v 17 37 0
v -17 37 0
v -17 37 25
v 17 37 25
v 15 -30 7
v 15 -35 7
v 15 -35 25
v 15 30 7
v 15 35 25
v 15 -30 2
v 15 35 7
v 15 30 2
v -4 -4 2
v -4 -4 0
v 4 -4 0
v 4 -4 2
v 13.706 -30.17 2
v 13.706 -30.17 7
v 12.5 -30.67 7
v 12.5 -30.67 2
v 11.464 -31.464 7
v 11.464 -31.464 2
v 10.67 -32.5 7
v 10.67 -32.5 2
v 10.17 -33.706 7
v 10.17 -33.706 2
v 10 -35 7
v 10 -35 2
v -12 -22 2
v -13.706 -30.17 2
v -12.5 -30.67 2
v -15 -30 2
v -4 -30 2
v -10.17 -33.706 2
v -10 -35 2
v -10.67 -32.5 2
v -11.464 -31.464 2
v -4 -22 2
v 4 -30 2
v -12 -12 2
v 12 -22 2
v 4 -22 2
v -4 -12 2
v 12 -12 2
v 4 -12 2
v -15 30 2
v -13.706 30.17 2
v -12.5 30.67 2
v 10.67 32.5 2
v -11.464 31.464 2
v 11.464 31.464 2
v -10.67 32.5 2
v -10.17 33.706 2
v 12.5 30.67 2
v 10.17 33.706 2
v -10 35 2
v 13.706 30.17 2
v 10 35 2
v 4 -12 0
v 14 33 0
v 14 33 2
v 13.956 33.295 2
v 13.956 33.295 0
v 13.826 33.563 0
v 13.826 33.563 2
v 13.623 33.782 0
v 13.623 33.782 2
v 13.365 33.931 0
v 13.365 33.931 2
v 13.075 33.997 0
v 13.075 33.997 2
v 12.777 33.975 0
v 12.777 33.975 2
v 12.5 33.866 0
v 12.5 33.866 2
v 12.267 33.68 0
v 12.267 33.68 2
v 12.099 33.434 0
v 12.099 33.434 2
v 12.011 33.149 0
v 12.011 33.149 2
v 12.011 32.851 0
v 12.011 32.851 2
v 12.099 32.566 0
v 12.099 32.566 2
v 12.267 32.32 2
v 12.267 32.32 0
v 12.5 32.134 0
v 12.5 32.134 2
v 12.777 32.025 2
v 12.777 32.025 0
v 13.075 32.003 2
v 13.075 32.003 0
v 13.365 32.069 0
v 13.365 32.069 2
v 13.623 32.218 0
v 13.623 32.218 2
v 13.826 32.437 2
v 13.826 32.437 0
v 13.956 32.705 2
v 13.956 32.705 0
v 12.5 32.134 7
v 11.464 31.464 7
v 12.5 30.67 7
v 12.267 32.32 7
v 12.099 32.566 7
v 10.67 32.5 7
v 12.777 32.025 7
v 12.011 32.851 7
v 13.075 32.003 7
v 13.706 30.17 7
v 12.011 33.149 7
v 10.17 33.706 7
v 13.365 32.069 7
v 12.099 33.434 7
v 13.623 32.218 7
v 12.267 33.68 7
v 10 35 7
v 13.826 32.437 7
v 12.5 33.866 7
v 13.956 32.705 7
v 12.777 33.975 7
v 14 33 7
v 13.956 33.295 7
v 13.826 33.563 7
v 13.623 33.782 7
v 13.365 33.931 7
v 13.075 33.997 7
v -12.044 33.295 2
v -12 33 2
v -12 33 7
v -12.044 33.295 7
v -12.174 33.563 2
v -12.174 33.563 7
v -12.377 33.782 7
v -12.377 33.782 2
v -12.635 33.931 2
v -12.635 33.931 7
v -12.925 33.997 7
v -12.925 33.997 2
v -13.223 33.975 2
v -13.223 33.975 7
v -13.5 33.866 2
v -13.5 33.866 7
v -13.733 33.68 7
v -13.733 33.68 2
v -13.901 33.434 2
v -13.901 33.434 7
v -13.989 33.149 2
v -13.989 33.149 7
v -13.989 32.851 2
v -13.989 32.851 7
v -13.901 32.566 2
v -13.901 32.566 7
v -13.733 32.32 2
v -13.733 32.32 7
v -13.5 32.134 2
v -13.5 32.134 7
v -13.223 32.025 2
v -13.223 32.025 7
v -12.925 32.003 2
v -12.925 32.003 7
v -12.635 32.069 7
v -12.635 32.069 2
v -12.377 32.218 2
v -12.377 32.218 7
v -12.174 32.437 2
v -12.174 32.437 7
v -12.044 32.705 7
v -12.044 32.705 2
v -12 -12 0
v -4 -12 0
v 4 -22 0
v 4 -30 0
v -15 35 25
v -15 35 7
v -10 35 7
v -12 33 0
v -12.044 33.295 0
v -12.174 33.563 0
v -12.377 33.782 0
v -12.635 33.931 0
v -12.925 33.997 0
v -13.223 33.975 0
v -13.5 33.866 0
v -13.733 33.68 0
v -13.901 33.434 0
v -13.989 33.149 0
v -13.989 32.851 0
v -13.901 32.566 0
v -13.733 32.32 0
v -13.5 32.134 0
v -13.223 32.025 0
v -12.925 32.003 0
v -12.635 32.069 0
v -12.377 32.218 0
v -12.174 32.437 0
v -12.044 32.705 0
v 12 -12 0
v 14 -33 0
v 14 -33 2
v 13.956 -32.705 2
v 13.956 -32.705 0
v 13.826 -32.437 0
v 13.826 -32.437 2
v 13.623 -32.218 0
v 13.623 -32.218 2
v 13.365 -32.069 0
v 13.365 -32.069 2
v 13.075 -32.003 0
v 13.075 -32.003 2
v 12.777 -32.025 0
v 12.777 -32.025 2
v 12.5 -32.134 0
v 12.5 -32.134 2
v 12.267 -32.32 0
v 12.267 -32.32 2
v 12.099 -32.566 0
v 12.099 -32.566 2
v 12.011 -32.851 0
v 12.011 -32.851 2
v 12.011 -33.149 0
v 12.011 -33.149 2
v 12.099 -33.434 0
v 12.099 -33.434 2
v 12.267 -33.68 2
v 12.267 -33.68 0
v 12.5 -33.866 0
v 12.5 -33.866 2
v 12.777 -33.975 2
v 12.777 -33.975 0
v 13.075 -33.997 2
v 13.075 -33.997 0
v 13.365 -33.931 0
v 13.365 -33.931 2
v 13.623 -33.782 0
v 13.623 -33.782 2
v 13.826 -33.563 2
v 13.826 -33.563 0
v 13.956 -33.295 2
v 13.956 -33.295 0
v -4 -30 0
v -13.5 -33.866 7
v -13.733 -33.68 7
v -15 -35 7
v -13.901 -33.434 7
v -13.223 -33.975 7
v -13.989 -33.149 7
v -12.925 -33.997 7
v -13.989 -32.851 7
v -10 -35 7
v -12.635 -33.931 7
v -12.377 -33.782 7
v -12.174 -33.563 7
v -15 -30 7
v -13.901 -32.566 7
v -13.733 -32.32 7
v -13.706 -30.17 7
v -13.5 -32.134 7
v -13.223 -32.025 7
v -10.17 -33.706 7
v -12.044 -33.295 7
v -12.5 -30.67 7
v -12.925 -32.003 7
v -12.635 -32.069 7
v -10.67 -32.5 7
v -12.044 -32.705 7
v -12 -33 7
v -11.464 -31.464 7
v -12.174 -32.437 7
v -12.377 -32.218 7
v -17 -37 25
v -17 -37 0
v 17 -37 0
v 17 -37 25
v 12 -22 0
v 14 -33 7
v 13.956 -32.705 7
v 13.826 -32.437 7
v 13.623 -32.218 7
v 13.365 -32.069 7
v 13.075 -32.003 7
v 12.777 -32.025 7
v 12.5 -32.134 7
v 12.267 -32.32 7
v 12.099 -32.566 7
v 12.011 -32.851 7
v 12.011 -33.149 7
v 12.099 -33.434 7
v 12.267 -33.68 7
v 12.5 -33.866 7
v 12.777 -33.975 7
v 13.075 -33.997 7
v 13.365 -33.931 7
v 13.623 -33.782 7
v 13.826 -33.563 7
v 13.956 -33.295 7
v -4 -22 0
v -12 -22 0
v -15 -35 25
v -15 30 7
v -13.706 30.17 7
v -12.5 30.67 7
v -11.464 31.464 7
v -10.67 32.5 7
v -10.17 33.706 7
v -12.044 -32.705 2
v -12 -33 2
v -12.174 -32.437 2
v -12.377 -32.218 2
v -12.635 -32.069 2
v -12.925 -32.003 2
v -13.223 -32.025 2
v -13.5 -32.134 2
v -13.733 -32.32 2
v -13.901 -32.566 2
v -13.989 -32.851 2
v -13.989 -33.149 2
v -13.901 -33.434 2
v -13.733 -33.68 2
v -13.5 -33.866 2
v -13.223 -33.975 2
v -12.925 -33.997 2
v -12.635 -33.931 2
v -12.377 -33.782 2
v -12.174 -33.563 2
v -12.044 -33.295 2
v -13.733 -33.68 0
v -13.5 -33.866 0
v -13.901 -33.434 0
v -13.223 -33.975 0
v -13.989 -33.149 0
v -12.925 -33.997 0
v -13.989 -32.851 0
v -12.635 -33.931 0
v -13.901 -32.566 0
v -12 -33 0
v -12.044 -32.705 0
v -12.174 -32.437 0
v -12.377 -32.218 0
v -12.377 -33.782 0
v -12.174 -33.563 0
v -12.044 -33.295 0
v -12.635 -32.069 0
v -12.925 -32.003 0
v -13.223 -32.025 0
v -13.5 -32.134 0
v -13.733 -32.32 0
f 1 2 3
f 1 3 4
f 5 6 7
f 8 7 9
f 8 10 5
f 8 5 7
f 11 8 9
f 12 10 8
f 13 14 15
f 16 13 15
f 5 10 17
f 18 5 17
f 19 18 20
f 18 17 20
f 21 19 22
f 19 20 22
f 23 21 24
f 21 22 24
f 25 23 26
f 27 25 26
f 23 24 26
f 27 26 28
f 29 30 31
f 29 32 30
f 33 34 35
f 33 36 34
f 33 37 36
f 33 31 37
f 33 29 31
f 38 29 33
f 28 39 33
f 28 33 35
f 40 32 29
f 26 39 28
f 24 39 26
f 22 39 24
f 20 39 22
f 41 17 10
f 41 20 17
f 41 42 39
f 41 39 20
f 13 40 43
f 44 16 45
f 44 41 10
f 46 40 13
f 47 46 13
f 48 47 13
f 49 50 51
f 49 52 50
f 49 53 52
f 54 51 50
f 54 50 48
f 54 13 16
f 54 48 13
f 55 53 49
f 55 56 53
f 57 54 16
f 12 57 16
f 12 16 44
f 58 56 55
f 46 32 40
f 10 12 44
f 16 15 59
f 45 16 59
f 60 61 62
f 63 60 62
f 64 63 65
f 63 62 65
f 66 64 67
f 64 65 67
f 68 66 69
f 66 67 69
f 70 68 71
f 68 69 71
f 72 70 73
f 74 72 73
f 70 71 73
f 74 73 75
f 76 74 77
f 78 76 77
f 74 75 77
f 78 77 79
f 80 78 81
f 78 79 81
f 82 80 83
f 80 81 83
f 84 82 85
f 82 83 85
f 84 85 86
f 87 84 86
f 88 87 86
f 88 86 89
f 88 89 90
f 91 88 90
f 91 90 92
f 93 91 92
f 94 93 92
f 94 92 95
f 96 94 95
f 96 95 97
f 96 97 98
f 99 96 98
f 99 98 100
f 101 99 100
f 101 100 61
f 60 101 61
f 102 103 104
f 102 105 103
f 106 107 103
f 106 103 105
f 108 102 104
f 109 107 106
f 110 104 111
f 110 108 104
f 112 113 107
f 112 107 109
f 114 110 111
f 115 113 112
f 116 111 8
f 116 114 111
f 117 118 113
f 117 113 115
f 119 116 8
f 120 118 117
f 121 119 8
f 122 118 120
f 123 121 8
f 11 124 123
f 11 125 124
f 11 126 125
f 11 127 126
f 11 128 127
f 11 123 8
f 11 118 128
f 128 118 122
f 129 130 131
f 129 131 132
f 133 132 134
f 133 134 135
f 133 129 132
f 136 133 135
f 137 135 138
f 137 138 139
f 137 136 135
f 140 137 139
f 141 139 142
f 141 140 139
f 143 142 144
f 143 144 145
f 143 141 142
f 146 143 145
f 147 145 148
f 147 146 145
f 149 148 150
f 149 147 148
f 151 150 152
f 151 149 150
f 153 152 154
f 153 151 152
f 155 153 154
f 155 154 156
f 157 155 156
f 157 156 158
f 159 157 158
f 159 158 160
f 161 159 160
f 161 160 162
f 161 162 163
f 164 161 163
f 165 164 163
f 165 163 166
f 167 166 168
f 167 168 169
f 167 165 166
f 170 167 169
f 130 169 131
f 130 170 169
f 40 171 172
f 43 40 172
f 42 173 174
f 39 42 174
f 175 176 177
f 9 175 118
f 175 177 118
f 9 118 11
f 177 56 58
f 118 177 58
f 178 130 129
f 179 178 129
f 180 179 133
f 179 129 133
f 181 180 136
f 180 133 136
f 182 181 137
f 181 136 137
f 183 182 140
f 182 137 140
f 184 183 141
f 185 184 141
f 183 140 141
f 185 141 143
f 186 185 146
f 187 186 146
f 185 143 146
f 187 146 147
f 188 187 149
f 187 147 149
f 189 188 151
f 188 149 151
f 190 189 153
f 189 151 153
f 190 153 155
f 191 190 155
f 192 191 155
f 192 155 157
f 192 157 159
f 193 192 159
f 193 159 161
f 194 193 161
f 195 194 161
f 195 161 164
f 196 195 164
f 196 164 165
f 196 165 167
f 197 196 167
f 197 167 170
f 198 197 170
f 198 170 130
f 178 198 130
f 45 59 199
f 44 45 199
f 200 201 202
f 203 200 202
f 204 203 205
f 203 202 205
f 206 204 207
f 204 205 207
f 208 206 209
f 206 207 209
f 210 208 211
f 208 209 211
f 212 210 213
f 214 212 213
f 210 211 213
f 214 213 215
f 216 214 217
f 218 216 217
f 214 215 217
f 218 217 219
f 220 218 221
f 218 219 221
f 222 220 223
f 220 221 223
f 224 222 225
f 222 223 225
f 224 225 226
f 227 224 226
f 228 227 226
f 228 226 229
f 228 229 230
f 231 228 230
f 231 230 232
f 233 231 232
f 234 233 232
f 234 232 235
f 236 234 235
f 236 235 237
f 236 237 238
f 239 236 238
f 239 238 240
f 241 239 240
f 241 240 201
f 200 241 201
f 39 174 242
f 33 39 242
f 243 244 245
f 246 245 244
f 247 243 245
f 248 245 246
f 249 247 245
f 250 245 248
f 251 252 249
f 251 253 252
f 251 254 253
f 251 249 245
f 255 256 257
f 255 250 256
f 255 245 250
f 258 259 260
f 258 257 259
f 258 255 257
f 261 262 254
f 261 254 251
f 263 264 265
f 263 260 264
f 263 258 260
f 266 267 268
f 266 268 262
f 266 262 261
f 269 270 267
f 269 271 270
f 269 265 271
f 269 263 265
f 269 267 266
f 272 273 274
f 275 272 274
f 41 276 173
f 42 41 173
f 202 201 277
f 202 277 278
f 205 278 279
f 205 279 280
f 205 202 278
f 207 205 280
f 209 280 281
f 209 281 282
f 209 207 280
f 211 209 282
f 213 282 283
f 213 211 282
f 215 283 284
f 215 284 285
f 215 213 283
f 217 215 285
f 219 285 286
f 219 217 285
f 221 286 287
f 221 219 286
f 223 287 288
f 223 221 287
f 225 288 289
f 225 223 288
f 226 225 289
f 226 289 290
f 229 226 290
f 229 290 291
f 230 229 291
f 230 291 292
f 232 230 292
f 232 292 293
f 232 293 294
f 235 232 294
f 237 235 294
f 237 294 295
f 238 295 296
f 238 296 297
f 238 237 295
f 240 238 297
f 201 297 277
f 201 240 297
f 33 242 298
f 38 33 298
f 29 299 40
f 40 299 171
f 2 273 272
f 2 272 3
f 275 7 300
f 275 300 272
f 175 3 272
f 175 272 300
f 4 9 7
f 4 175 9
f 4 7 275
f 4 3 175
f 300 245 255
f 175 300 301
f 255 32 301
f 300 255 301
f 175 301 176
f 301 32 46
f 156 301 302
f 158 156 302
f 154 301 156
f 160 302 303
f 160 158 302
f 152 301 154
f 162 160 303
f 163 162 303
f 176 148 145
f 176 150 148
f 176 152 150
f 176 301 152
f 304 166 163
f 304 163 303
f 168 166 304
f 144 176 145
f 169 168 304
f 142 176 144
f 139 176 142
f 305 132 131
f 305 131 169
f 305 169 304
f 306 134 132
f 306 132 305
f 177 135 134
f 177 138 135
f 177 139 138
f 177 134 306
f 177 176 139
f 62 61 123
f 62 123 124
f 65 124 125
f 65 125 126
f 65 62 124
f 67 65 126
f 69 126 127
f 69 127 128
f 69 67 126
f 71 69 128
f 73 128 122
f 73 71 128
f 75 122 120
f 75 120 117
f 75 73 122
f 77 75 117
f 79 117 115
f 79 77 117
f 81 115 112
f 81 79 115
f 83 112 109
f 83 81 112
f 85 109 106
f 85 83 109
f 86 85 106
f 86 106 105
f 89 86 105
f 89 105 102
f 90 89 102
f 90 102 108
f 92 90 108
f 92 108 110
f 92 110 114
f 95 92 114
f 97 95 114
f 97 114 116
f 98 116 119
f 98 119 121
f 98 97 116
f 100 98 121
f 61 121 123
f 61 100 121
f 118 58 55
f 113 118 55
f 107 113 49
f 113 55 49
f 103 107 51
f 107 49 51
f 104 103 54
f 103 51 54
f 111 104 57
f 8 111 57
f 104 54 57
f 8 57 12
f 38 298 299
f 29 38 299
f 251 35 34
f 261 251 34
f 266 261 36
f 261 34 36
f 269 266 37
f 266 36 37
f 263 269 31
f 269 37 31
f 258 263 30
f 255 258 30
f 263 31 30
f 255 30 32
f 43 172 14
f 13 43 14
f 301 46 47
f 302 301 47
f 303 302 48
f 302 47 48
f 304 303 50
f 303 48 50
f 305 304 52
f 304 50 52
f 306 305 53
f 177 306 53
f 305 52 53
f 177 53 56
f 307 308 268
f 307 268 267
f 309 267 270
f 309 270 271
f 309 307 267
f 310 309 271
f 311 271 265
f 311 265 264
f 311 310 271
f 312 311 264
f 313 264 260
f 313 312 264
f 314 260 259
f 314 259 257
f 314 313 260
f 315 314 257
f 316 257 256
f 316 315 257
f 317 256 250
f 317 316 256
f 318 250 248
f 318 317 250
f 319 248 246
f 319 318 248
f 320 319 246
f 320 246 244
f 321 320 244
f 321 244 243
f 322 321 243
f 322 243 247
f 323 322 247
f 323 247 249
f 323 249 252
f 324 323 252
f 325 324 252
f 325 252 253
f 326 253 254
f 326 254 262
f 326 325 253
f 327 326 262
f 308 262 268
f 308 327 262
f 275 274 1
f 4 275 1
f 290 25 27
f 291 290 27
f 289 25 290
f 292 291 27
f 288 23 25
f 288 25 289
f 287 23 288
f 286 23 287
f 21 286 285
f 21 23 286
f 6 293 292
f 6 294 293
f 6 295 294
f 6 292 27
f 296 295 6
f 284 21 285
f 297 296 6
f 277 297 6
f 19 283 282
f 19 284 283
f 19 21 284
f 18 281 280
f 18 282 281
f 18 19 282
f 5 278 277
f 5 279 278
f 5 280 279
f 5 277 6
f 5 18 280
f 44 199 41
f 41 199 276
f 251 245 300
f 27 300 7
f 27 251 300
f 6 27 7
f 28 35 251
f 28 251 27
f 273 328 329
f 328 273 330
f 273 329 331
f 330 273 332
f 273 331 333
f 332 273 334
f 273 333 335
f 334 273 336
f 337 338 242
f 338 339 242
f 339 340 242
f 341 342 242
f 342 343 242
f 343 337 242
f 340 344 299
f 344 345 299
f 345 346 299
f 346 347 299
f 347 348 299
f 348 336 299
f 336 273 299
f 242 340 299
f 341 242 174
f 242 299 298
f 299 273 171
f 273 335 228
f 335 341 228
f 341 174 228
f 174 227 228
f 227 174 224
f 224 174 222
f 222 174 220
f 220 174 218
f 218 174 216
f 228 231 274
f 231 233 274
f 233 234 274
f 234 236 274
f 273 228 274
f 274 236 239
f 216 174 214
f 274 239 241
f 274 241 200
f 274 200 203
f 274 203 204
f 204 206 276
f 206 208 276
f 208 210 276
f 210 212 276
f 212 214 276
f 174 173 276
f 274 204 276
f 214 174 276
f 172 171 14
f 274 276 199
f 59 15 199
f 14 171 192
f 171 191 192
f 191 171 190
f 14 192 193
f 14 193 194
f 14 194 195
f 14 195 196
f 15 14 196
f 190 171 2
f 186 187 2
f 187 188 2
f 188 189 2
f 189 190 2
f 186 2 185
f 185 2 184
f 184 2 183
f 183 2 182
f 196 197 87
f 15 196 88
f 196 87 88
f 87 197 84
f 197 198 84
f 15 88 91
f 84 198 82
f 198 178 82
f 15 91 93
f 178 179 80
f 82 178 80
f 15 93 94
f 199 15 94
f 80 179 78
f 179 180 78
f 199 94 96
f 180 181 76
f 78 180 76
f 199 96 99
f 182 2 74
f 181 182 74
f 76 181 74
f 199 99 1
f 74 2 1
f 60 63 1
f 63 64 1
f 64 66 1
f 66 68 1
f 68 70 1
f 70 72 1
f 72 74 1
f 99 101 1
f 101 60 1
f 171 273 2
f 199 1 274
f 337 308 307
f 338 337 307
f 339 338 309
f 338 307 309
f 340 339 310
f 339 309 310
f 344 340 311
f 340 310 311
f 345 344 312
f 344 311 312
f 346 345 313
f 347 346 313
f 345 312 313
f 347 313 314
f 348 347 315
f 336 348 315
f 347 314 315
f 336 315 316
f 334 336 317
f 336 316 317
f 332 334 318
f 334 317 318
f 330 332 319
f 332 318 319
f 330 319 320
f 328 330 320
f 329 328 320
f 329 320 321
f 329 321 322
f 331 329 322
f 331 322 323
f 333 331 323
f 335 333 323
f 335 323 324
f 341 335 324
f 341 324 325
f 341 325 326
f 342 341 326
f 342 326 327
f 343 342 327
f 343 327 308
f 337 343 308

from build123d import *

# Parameters (mm, degrees)
F0_W     = 34
F0_H     = 74
F1_DEPTH = 25
F2_T     = -2
F3_R     = 1
F4_DEPTH = 25
F5_R     = 1
F6_DEPTH = 5
F8_DEPTH = 25


with BuildPart() as f1:
    # F0 (on Top) → F1 (new body)
    with BuildSketch(Plane.XY):
        Rectangle(F0_W, F0_H)
    extrude(amount=F1_DEPTH)

    # F2
    f2_openings = [f1.faces().sort_by_distance(p)[0] for p in [
        (0, 0, 25),
    ]]
    offset(amount=F2_T, openings=f2_openings)

    # F3 (on face) → F4 (cut)
    with BuildSketch(Plane.XY.offset(2)):
        with Locations((13, 33)):
            Circle(F3_R)
        with Locations((-13, 33)):
            Circle(F3_R)
        with Locations((13, -33)):
            Circle(F3_R)
        with Locations((-13, -33)):
            Circle(F3_R)
    extrude(amount=-F4_DEPTH, mode=Mode.SUBTRACT)

    # F5 (on face) → F6 (join)
    with BuildSketch(Plane.XY.offset(2)):
        with BuildLine():
            Line((15, -35), (15, -30))
            ThreePointArc((15, -30), (11.4644660941, -31.4644660941), (10, -35))
            Line((10, -35), (15, -35))
        make_face()
        with Locations((13, -33)):
            Circle(F5_R, mode=Mode.SUBTRACT)
        with BuildLine():
            ThreePointArc((-10, -35), (-11.4644660941, -31.4644660941), (-15, -30))
            Line((-15, -30), (-15, -35))
            Line((-15, -35), (-10, -35))
        make_face()
        with Locations((-13, -33)):
            Circle(F5_R, mode=Mode.SUBTRACT)
        with BuildLine():
            ThreePointArc((-15, 30), (-11.4644660941, 31.4644660941), (-10, 35))
            Line((-10, 35), (-15, 35))
            Line((-15, 35), (-15, 30))
        make_face()
        with Locations((-13, 33)):
            Circle(F5_R, mode=Mode.SUBTRACT)
        with BuildLine():
            Line((15, 35), (10, 35))
            ThreePointArc((10, 35), (11.4644660941, 31.4644660941), (15, 30))
            Line((15, 30), (15, 35))
        make_face()
        with Locations((13, 33)):
            Circle(F5_R, mode=Mode.SUBTRACT)
    extrude(amount=F6_DEPTH)

    # F7 (on face) → F8 (cut)
    with BuildSketch(Plane(origin=(0, 0, 0), x_dir=(1, 0, 0), z_dir=(0, 0, -1))):
        Polygon((4, 22), (4, 30), (-4, 30), (-4, 22), (-12, 22), (-12, 12), (-4, 12), (-4, 4), (4, 4), (4, 12), (12, 12), (12, 22), align=None)
    extrude(amount=-F8_DEPTH, mode=Mode.SUBTRACT)


solid = f1.part
